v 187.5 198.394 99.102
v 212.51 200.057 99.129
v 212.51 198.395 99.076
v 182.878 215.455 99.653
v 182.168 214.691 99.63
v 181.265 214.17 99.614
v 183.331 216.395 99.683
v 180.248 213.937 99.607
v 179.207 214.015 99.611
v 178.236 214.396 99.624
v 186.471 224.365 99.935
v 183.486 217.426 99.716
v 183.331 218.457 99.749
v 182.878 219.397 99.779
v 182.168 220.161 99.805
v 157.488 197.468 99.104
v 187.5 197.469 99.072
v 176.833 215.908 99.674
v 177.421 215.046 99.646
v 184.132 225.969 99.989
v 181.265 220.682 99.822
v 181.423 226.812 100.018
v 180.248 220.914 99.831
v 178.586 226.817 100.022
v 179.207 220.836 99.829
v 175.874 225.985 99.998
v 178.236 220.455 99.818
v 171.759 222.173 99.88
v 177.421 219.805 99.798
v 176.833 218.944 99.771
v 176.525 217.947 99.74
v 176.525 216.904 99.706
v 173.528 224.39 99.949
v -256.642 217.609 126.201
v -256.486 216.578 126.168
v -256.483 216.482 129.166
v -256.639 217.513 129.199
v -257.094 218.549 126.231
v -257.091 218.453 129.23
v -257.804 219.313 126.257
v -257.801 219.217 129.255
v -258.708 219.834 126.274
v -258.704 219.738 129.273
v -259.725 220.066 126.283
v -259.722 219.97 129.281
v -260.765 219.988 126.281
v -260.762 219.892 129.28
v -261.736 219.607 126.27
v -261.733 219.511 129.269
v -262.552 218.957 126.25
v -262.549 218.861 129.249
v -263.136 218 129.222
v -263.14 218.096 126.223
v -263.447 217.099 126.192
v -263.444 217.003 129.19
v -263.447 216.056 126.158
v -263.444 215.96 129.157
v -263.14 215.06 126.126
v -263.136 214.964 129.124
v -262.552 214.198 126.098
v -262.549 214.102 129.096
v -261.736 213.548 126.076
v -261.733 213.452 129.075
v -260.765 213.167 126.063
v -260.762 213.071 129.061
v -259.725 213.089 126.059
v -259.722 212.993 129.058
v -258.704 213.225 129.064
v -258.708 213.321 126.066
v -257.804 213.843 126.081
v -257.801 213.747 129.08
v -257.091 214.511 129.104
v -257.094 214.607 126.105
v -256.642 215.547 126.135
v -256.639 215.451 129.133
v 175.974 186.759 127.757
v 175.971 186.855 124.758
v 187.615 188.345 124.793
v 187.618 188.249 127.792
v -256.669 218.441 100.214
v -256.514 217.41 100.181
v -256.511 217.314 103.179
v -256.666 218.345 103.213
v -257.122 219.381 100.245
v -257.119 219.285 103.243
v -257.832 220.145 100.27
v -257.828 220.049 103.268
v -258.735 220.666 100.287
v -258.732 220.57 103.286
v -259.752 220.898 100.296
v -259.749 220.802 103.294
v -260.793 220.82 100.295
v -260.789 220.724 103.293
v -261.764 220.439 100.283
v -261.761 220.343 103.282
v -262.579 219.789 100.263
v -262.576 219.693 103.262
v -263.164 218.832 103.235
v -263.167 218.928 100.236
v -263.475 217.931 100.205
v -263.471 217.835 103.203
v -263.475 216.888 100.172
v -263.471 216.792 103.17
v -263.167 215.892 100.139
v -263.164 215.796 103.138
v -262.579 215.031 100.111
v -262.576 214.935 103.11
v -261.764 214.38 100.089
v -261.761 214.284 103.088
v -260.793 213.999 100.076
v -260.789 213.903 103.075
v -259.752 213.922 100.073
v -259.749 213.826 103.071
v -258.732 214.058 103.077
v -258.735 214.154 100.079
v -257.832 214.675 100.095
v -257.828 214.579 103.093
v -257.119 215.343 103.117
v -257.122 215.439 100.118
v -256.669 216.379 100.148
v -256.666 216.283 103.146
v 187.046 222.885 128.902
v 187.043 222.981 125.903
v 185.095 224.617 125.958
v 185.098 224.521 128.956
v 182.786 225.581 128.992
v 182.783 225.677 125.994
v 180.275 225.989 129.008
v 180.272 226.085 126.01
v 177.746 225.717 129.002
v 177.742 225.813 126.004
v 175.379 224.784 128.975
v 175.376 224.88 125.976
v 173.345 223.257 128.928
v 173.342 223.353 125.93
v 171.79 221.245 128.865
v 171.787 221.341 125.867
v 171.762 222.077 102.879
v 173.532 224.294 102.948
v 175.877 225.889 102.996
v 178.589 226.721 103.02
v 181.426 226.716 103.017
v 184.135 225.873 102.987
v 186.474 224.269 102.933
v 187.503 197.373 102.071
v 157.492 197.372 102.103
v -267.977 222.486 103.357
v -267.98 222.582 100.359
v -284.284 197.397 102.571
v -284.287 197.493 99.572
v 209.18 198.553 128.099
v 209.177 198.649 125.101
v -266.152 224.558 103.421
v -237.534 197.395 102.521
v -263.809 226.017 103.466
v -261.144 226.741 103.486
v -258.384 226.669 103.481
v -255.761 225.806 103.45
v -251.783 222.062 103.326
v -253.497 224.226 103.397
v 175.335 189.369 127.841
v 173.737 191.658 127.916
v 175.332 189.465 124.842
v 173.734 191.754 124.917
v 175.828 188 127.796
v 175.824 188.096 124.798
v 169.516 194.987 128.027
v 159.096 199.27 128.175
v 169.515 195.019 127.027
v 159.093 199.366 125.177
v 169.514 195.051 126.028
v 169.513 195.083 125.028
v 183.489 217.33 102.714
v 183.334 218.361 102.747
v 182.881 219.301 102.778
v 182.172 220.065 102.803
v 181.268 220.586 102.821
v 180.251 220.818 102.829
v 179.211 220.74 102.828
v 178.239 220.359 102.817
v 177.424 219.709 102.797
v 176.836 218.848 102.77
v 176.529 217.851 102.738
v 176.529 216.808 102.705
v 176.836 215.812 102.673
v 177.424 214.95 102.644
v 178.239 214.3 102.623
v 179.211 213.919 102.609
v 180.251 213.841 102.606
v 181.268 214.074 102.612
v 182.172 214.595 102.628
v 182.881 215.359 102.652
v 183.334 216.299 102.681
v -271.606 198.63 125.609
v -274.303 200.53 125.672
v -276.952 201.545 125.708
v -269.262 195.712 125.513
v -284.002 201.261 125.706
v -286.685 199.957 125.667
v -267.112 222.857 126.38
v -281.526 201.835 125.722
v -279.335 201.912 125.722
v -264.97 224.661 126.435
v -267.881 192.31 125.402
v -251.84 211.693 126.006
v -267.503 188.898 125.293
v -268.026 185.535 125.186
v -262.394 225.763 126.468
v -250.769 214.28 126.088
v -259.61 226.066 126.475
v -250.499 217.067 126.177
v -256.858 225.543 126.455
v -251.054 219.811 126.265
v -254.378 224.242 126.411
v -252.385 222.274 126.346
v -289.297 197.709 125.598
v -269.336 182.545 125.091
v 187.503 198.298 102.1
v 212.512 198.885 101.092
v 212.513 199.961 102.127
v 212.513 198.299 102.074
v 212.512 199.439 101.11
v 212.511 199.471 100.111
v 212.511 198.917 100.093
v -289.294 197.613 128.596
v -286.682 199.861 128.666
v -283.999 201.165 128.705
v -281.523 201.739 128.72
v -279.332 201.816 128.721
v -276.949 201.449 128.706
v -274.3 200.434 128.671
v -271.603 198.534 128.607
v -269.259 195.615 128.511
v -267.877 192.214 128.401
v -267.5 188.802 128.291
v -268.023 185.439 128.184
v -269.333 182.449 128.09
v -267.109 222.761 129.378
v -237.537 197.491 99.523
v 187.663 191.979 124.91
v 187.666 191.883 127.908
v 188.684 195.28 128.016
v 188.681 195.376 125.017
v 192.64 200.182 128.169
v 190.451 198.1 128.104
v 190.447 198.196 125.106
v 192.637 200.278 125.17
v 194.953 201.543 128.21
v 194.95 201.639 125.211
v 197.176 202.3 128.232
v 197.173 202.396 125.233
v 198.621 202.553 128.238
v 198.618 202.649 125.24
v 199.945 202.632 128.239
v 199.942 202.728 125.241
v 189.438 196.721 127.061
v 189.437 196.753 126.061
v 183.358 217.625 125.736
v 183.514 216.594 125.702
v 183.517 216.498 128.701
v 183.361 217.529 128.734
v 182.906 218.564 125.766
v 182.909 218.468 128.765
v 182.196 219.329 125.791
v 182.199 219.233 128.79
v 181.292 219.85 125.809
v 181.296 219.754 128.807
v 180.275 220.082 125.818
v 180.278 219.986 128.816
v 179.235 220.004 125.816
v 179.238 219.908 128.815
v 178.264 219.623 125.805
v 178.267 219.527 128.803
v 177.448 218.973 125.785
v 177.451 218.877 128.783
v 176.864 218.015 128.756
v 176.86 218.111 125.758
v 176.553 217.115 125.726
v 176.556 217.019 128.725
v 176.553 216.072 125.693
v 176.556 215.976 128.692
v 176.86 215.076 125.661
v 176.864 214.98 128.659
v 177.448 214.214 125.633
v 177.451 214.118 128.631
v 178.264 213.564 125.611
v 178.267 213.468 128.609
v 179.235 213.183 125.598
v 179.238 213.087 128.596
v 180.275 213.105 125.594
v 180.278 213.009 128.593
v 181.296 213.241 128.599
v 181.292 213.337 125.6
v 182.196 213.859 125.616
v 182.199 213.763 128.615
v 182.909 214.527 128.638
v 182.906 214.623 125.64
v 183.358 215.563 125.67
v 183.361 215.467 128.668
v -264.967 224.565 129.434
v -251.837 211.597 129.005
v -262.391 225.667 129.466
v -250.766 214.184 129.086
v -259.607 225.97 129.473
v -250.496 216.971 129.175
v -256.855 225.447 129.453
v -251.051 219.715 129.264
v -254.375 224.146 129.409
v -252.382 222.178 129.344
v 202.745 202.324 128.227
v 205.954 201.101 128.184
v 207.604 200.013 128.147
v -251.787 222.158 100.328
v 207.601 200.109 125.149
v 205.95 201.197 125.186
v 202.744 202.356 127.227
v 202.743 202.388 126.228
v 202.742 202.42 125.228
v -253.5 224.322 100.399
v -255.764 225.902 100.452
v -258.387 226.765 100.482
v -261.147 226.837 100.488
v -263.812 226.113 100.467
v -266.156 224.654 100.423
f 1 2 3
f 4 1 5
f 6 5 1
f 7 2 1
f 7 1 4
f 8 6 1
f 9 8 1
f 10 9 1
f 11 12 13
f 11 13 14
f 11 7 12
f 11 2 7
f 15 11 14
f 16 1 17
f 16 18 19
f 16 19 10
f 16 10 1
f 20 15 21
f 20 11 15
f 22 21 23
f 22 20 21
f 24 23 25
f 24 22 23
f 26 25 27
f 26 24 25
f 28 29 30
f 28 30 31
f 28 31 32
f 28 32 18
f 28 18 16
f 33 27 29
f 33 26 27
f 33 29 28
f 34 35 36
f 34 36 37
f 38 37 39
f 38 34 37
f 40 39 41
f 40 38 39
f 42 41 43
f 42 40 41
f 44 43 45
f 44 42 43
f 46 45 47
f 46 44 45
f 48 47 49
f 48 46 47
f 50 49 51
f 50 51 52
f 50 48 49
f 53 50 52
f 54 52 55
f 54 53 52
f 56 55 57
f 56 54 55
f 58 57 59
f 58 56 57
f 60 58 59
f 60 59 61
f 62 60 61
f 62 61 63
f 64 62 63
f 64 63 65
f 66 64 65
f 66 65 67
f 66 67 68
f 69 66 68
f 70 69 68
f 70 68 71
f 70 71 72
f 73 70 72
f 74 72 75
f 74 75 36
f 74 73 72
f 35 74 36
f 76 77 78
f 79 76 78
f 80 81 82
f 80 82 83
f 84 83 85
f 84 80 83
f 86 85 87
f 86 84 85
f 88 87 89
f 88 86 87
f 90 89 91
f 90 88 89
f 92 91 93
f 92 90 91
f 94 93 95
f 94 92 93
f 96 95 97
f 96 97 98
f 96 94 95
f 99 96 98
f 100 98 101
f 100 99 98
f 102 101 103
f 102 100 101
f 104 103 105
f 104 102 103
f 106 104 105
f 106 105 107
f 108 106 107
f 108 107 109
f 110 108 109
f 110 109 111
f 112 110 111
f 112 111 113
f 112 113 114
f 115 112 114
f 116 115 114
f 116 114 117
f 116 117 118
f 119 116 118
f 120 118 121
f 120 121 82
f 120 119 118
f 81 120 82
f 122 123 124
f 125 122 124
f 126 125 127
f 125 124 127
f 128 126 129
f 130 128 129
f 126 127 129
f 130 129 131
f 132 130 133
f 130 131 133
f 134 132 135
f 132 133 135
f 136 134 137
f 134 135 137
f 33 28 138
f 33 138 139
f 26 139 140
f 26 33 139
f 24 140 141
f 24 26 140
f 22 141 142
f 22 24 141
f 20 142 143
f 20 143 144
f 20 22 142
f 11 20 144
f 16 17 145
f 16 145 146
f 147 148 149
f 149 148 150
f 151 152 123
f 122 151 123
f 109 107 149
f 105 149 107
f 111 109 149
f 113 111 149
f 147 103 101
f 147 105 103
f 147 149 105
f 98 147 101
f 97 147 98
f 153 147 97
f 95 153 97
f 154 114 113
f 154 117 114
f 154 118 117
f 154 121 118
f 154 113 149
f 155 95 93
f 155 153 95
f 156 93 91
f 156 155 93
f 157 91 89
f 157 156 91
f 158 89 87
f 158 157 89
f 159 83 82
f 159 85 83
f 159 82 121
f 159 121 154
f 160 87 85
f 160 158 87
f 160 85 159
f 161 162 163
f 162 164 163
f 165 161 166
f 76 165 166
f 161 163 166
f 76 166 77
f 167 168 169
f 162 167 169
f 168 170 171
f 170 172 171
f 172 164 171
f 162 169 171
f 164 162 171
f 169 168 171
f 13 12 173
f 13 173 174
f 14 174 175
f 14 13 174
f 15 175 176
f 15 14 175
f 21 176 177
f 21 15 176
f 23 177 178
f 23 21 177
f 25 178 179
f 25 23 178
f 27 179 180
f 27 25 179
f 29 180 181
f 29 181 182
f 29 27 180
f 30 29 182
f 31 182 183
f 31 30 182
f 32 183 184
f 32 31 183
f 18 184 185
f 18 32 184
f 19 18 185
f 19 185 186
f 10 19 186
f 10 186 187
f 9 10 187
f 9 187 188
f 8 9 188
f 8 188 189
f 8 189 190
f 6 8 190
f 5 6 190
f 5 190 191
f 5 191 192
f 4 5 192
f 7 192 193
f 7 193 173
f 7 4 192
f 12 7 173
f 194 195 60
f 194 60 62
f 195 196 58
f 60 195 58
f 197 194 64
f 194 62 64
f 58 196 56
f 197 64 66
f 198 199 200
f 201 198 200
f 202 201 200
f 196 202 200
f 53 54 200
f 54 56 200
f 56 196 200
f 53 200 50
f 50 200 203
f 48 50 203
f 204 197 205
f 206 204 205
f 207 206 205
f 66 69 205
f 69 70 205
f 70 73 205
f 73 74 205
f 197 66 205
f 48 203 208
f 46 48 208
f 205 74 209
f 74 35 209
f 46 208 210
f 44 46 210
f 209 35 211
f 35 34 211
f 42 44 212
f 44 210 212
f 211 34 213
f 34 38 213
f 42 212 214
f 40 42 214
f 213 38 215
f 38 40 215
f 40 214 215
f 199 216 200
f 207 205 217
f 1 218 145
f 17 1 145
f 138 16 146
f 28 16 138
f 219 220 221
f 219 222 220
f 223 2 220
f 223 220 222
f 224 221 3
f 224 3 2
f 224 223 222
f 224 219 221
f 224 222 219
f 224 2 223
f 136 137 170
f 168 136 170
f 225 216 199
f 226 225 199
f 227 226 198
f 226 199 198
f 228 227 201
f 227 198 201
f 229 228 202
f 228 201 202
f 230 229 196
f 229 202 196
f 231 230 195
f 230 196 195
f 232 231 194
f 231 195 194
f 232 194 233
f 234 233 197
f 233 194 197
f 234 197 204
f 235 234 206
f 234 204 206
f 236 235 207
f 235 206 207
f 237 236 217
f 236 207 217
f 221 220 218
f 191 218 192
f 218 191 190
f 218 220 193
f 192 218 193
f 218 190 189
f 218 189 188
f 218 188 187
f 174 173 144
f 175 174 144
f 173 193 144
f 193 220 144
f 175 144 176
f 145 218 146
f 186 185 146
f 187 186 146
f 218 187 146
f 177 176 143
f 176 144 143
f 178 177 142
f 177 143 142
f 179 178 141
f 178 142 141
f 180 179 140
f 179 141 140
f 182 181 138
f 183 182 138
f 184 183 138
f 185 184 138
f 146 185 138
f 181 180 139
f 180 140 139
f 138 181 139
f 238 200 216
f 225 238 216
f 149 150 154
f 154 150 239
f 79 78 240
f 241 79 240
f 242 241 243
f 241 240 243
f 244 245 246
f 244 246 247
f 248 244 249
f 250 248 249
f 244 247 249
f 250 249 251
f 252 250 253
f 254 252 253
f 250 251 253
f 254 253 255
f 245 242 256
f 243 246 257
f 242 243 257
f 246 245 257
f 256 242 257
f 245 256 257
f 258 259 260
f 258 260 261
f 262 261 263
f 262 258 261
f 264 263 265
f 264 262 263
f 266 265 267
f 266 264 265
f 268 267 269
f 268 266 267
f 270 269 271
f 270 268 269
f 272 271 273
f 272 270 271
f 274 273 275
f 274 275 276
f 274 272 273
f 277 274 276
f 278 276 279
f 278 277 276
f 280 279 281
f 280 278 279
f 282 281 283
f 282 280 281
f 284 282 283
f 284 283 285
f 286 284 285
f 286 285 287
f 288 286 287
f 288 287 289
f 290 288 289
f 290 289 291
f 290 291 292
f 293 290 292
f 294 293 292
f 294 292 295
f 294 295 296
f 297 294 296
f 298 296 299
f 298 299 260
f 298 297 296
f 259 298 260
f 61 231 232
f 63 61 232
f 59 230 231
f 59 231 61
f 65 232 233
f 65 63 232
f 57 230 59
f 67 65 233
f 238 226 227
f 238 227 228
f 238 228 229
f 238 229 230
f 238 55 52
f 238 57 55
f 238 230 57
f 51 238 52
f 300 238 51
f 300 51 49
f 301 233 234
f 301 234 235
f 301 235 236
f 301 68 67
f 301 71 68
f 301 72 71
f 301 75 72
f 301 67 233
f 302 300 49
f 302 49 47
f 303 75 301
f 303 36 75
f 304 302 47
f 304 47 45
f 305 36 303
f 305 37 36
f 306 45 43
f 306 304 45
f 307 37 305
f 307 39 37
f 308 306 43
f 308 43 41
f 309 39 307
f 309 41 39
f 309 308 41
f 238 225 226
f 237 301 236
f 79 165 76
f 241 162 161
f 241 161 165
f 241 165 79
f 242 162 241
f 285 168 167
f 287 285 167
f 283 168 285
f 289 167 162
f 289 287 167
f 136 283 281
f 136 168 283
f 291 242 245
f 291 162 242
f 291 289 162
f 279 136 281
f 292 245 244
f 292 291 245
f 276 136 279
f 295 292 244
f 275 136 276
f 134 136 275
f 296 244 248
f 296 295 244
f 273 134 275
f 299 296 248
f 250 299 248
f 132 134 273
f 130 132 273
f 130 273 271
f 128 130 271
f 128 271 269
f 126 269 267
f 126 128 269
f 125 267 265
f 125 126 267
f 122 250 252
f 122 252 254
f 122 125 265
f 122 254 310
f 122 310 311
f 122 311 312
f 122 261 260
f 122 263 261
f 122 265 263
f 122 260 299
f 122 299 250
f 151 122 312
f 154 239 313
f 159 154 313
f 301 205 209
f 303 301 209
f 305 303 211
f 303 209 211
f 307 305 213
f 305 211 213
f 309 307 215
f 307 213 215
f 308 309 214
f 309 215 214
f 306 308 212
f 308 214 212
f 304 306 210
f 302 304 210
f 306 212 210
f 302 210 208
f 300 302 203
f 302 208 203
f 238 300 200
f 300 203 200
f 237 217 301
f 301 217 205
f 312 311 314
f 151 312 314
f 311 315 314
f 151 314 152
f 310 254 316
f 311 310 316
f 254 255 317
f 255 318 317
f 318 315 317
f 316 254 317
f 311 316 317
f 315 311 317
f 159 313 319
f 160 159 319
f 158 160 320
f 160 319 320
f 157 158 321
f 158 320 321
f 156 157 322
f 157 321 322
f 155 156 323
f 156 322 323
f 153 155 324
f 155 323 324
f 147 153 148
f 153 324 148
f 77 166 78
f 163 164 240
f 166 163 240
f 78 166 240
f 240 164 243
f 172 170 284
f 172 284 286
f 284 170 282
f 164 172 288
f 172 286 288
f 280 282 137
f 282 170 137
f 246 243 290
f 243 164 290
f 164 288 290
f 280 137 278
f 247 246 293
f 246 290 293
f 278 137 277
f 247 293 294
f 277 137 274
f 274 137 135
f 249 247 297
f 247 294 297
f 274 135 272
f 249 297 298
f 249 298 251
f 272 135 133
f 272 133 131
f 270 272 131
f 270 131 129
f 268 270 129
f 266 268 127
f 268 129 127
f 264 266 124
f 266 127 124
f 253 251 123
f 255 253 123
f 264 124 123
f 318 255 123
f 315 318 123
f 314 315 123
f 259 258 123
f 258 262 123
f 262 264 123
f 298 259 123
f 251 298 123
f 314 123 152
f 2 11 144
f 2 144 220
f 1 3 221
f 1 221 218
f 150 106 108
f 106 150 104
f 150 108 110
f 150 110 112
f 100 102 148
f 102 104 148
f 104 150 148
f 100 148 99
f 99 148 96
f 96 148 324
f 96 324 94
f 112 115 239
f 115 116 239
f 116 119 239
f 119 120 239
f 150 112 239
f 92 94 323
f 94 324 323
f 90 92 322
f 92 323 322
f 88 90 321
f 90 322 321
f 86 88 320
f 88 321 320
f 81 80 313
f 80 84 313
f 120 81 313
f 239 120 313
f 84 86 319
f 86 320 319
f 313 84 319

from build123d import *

# Parameters (mm, degrees)
SZKIC1_R                      = 3.5
DODANIE_WYCI_GNI_CIE1_DEPTH   = 3
DODANIE_WYCI_GNI_CIE1_2_DEPTH = 3
SZKIC2_R                      = 3.5
DODANIE_WYCI_GNI_CIE2_DEPTH   = 3
DODANIE_WYCI_GNI_CIE2_2_DEPTH = 3


with BuildPart() as part:
    # Szkic1 → Dodanie-wyciągnięcie1 (new body)
    with BuildSketch(Plane(origin=(0.125765066, -3.805521466, 118.838710879), x_dir=(0.999999441, 3.3854e-05, -0.001057199), z_dir=(0.001057741, -0.03200615, 0.999487112))):
        with BuildLine():
            ThreePointArc((-251.965816374, 215.617689907), (-254.503699361, 228.172933409), (-267.237793388, 226.788072858))
            Line((-267.237793388, 226.788072858), (-289.422618248, 201.6277301))
            add(Edge.make_bspline(
                [(-289.422618248, 201.6277301), (-286.808552781, 204.592404537), (-283.407283221, 205.833574434), (-280.193766535, 205.850681883), (-270.834495382, 205.900506817), (-262.792202195, 197.572371375), (-269.462240018, 186.454814776)],
                knots=[0.346618378, 0.346618378, 0.346618378, 0.346618378, 0.5, 0.5, 0.5, 0.821122795, 0.821122795, 0.821122795, 0.821122795], degree=3, weights=[0.574680887, 0.653718133, 0.79549117, 1, 0.571836274, 0.418658812, 0.540467615]))
            Line((-269.462240018, 186.454814776), (-251.965816374, 215.617689907))
        make_face()
        with Locations((-260.112159551, 220.505132271)):
            Circle(SZKIC1_R, mode=Mode.SUBTRACT)
    extrude(amount=DODANIE_WYCI_GNI_CIE1_DEPTH)


with BuildPart() as body_2:
    # Szkic1 → Dodanie-wyci_gni_cie1 2 (new body)
    with BuildSketch(Plane(origin=(0.125765066, -3.805521466, 118.838710879), x_dir=(0.999999441, 3.3854e-05, -0.001057199), z_dir=(0.001057741, -0.03200615, 0.999487112))):
        with BuildLine():
            Line((209.050872979, 202.551210442), (186.91733989, 226.896739247))
            ThreePointArc((186.91733989, 226.896739247), (178.872372552, 229.951697855), (171.660845224, 225.256152606))
            Line((171.660845224, 225.256152606), (158.967522927, 203.27067347))
            add(Edge.make_bspline(
                [(158.967522927, 203.27067347), (170.737920376, 199.98415846), (175.843611608, 195.08979588), (175.844941209, 190.752233729)],
                knots=[0.803274238, 0.803274238, 0.803274238, 0.803274238, 0.990815919, 0.990815919, 0.990815919, 0.990815919], degree=3, weights=[0.522705155, 0.575991236, 0.723069003, 0.963938456]))
            Line((175.844941209, 190.752233729), (187.48923709, 192.242392262))
            add(Edge.make_bspline(
                [(187.48923709, 192.242392262), (186.295981012, 201.566653094), (192.964200275, 206.596365575), (199.816335243, 206.63284354)],
                knots=[0.734440243, 0.734440243, 0.734440243, 0.734440243, 1, 1, 1, 1], degree=3, weights=[0.501936848, 0.479899273, 0.645920324, 1]))
            add(Edge.make_bspline(
                [(199.816335243, 206.63284354), (203.012558551, 206.649858927), (206.408564562, 205.457587631), (209.050872979, 202.551210442)],
                knots=[0, 0, 0, 0, 0.152724288, 0.152724288, 0.152724288, 0.152724288], degree=3, weights=[1, 0.796367616, 0.654934453, 0.575700513]))
        make_face()
        with Locations((179.88808656, 220.506152606)):
            Circle(SZKIC1_R, mode=Mode.SUBTRACT)
    extrude(amount=DODANIE_WYCI_GNI_CIE1_2_DEPTH)


with BuildPart() as body_3:
    # Szkic2 → Dodanie-wyciągnięcie2 (new body)
    with BuildSketch(Plane(origin=(0.098263803, -2.973361554, 92.852045961), x_dir=(0.999999441, 3.3854e-05, -0.001057199), z_dir=(0.001057741, -0.03200615, 0.999487112))):
        with BuildLine():
            Line((186.372717659, 227.448742865), (212.411687249, 203.127400877))
            add(Edge.make_bspline(
                [(212.411687249, 203.127400877), (212.411680046, 202.573087425), (212.411635073, 202.018774306), (212.411552328, 201.46446403)],
                knots=[0, 0, 0, 0, 0.728559565, 0.728559565, 0.728559565, 0.728559565], degree=3, weights=[1, 0.999997926, 0.999997363, 0.999998311]))
            Line((212.411552328, 201.46446403), (187.401609388, 201.46446403))
            Line((187.401609388, 201.46446403), (187.401609388, 200.538693566))
            Line((187.401609388, 200.538693566), (157.390213594, 200.538693566))
            Line((157.390213594, 200.538693566), (171.660845224, 225.256152606))
            ThreePointArc((171.660845224, 225.256152606), (178.487716745, 229.902373356), (186.372717659, 227.448742865))
        make_face()
        with Locations((179.88808656, 220.506152606)):
            Circle(SZKIC2_R, mode=Mode.SUBTRACT)
    extrude(amount=DODANIE_WYCI_GNI_CIE2_DEPTH)


with BuildPart() as body_4:
    # Szkic2 → Dodanie-wyci_gni_cie2 2 (new body)
    with BuildSketch(Plane(origin=(0.098263803, -2.973361554, 92.852045961), x_dir=(0.999999441, 3.3854e-05, -0.001057199), z_dir=(0.001057741, -0.03200615, 0.999487112))):
        with BuildLine():
            Line((-268.078773116, 225.680368333), (-284.385378892, 200.578435743))
            Line((-284.385378892, 200.578435743), (-237.635870616, 200.57505787))
            Line((-237.635870616, 200.57505787), (-251.884918215, 225.255132271))
            ThreePointArc((-251.884918215, 225.255132271), (-259.862784059, 230.001858647), (-268.078773116, 225.680368333))
        make_face()
        with Locations((-260.112159551, 220.505132271)):
            Circle(SZKIC2_R, mode=Mode.SUBTRACT)
    extrude(amount=DODANIE_WYCI_GNI_CIE2_2_DEPTH)


solid = Compound([part.part, body_2.part, body_3.part, body_4.part])
